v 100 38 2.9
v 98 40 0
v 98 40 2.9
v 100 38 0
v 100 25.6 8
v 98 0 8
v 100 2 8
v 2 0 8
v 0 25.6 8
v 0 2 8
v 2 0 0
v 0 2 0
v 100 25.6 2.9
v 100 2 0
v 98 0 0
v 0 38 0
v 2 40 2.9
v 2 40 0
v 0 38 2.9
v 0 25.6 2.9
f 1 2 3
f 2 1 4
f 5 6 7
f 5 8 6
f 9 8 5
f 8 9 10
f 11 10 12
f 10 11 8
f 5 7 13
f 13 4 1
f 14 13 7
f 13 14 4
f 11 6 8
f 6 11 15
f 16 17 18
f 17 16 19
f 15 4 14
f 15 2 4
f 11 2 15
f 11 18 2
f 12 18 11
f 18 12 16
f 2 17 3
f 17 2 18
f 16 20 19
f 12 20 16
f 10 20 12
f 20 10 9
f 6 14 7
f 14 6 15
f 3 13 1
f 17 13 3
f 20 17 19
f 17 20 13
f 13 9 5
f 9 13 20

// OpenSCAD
$fn = 32;

// ----------------------------------------------------------------------
// Stepped bar: sidestep, 100 x 40 x 8/2.9 mm
// ----------------------------------------------------------------------

// --- parameters (mm) ---
bar_l = 100;              // bar length, X
bar_w = 40;               // bar width, Y
plate_t = 8;              // thickness of the thick zone, Z
thin_t = 2.9;             // thickness of the thin zone
corner_c = 2;             // corner chamfer of the bar
step_cut = 5.1;           // material removed from the thin zone
ledge_y = 25.6;           // start of the ledge from the front edge
depth_1 = 5.1;            // depth of cut 1 from the top face

profile = [[2, 0], [98, 0], [100, 2], [100, 38], [98, 40], [2, 40], [0, 38], [0, 2]];  // primary outline, 8 points, counter clockwise
void_1 = [[-1, 25.6], [101, 25.6], [101, 41], [-1, 41]];  // ledge cut along one edge, 4 points

// --- the one profile operation ---
difference() {
  linear_extrude(height = plate_t) polygon(points = profile);
  translate([0, 0, plate_t - depth_1])
    linear_extrude(height = depth_1 + 1) polygon(points = void_1);
}
